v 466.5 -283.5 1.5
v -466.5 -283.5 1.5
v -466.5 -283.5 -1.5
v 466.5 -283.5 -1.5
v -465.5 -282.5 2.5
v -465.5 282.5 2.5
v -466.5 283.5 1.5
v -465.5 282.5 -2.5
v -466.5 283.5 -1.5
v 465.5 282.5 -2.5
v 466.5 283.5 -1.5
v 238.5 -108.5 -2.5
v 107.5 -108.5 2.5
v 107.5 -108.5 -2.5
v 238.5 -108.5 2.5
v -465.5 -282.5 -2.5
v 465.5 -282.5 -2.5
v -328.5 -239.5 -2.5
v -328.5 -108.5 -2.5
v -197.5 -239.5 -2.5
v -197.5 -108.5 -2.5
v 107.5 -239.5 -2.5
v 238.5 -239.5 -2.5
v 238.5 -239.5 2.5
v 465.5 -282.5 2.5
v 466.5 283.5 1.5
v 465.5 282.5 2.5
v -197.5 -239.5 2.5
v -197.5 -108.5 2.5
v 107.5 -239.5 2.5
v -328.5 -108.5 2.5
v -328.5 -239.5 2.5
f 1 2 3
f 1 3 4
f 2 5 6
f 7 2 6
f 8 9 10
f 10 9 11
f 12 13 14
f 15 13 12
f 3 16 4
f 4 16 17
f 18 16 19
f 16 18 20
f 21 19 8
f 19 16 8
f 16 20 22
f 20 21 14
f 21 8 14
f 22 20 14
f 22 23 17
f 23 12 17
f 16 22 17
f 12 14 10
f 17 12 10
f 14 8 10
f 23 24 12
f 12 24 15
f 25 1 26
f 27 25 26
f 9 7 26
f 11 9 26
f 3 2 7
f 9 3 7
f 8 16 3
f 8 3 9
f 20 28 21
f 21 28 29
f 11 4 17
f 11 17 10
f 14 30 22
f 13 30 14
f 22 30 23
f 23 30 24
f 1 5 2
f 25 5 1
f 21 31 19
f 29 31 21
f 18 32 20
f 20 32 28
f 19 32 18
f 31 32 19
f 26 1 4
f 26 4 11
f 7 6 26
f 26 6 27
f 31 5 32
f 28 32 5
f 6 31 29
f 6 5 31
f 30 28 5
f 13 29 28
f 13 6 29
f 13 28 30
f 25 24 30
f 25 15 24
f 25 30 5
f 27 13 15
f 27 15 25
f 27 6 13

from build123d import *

# Parameters (mm, degrees)
F0_W     = 933
F0_H     = 567
F1_DEPTH = 2.5
F2_W     = 131
F2_H     = 131
F3_DEPTH = 5.001
F4_W     = 131
F4_H     = 131
F5_DEPTH = 5.001
F6_SIZE  = 1


with BuildPart() as f1:
    # F0 (on Top) → F1 (new body, symmetric)
    with BuildSketch(Plane.XY):
        Rectangle(F0_W, F0_H)
    extrude(amount=F1_DEPTH, both=True)

    # F2 (on face) → F3 (cut, through all)
    with BuildSketch(Plane.XY.offset(2.5)):
        with Locations((-263, -174)):
            Rectangle(F2_W, F2_H)
    extrude(amount=-F3_DEPTH, mode=Mode.SUBTRACT)

    # F4 (on face) → F5 (cut, through all)
    with BuildSketch(Plane.XY.offset(2.5)):
        with Locations((173, -174)):
            Rectangle(F4_W, F4_H)
    extrude(amount=-F5_DEPTH, mode=Mode.SUBTRACT)

    # F6
    f6_edges = [f1.edges().sort_by_distance(p)[0] for p in [
        (-466.5, 0, 2.5),
        (-466.5, 0, -2.5),
        (0, -283.5, -2.5),
        (0, -283.5, 2.5),
        (466.5, 0, -2.5),
        (466.5, 0, 2.5),
        (0, 283.5, 2.5),
        (0, 283.5, -2.5),
    ]]
    chamfer(f6_edges, length=F6_SIZE)


solid = f1.part
